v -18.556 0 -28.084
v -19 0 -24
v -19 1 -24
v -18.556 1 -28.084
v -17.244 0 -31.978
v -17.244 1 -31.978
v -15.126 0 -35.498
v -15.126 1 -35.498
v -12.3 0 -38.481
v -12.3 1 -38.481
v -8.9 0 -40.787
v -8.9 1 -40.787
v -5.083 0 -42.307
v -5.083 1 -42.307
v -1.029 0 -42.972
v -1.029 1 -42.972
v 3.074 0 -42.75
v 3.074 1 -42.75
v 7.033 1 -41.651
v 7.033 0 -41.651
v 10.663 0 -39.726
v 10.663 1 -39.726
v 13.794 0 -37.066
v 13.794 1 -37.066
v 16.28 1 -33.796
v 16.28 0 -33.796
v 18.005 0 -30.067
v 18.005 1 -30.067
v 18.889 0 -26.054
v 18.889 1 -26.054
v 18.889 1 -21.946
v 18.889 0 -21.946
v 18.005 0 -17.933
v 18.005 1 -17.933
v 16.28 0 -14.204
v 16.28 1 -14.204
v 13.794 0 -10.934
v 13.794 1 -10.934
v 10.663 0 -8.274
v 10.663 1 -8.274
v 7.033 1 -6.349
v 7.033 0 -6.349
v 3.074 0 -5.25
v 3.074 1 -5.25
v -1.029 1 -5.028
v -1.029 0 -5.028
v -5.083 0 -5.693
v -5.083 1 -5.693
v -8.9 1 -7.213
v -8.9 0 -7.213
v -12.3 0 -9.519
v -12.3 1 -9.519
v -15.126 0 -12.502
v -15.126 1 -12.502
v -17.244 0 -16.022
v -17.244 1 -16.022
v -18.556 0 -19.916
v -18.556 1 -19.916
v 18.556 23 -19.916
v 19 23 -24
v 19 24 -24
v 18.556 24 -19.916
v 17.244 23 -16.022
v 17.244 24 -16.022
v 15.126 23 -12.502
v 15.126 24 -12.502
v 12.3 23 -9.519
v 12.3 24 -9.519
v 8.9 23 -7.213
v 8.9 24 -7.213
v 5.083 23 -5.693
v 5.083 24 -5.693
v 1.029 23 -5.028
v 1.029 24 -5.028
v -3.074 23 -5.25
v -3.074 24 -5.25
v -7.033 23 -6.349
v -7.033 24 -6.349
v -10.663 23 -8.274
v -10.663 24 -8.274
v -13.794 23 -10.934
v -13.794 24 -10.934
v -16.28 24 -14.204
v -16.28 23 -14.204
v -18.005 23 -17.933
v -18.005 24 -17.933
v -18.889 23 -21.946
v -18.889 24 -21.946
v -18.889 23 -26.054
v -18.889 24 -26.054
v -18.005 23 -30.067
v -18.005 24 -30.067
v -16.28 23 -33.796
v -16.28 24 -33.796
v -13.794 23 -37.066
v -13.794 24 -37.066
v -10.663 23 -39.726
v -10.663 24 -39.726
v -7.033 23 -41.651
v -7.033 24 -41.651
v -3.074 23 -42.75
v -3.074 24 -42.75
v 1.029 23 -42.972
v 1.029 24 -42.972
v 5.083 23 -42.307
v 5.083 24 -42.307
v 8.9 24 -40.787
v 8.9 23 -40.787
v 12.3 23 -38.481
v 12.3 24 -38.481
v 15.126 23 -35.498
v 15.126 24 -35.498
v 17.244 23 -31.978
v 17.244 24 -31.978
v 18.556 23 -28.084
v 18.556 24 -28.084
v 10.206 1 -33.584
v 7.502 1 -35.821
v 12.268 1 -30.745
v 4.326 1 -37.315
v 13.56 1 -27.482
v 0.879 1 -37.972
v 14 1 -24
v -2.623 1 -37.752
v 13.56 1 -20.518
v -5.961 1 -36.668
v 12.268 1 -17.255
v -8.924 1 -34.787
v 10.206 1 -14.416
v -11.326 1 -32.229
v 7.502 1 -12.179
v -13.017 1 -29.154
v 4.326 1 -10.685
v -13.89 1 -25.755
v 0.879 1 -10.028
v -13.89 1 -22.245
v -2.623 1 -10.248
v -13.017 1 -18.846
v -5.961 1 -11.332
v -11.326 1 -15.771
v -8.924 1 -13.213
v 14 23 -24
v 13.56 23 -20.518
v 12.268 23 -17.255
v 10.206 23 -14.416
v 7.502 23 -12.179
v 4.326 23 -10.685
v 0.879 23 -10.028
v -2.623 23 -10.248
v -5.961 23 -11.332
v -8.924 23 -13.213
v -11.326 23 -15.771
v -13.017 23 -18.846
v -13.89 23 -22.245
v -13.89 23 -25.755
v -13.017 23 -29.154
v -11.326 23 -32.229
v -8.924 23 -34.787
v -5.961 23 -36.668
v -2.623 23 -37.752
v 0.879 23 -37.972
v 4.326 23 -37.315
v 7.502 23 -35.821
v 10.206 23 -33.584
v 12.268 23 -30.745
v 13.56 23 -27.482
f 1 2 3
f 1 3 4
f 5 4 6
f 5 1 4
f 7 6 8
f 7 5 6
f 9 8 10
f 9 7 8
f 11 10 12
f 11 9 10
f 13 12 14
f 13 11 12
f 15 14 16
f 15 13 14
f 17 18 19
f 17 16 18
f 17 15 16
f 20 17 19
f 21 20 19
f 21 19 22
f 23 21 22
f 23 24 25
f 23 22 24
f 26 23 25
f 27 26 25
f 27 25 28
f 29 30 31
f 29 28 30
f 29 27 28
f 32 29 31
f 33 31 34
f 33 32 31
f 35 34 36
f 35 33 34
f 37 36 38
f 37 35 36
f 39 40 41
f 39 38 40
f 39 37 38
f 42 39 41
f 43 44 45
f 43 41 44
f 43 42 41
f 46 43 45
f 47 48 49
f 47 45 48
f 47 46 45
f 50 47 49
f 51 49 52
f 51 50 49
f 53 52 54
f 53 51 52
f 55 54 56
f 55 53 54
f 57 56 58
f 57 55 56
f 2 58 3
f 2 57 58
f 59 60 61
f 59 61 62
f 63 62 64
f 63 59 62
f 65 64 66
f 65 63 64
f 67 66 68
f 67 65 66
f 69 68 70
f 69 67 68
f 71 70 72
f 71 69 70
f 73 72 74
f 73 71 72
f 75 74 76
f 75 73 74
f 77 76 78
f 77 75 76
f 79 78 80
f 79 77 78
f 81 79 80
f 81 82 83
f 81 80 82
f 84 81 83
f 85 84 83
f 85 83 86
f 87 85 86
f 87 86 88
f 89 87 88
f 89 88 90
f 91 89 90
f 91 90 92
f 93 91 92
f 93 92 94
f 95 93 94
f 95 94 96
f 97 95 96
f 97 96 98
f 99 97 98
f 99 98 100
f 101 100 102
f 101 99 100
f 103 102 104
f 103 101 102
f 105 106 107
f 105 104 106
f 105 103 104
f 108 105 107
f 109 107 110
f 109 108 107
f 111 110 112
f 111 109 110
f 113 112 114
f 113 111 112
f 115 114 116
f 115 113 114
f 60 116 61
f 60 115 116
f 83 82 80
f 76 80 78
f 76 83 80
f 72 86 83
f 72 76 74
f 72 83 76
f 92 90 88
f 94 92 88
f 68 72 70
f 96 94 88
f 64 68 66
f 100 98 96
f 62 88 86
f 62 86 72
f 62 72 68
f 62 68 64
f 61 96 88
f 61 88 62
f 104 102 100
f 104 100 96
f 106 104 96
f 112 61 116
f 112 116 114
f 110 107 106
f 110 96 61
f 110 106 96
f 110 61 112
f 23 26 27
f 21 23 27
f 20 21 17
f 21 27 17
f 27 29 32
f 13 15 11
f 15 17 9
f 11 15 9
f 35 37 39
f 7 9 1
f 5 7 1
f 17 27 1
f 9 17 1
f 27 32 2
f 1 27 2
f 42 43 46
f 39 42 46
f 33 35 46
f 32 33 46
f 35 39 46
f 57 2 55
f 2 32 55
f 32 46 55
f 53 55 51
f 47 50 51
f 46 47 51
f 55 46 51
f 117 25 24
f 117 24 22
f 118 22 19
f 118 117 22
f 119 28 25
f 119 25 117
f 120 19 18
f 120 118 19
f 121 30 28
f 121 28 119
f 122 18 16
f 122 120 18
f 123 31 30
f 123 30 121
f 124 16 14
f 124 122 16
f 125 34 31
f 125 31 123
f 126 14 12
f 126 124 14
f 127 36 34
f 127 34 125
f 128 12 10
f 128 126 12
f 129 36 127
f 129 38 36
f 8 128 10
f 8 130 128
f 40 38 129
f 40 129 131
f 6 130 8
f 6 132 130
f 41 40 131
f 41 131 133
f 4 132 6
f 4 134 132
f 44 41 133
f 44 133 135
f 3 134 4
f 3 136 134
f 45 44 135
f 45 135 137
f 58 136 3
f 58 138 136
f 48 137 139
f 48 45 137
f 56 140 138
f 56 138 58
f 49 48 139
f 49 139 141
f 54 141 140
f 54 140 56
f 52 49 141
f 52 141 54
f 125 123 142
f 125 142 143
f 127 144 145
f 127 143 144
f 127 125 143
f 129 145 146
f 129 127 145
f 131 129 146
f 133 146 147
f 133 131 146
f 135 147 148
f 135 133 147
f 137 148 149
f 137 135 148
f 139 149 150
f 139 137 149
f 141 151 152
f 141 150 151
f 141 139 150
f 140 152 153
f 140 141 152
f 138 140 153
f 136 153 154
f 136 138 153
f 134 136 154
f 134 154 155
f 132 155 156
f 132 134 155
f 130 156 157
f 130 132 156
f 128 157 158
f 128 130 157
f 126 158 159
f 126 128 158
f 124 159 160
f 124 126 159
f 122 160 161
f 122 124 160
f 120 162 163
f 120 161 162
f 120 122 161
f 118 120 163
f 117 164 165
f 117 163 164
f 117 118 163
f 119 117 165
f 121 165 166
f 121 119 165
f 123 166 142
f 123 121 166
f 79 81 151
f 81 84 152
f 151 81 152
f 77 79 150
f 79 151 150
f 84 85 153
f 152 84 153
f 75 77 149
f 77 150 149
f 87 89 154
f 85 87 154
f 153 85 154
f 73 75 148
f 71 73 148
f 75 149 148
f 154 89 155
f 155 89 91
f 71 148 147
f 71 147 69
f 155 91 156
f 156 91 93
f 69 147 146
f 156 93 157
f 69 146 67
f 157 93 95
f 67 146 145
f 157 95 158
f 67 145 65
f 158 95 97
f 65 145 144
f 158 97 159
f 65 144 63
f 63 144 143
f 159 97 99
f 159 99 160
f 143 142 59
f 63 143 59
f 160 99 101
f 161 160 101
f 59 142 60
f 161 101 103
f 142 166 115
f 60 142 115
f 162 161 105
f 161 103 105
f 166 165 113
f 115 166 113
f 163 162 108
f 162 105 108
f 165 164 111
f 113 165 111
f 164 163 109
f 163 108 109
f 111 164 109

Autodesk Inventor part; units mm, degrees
ref_plane "YZ Plane" through (0, 0, 0) normal (1, 0, 0) x (0, 1, 0)
ref_plane "XZ Plane" through (0, 0, 0) normal (0, 1, 0) x (-1, 0, 0)
ref_plane "XY Plane" through (0, 0, 0) normal (0, 0, 1) x (1, 0, 0)
sketch "Sketch1" plane through (0, 0, 0) normal (0, 1, 0) x (-1, 0, 0)
  circle A0 centre (0, -24) radius 19
  point P0 (0, 0)
  dimension "d1" = 38
  dimension "d3" = 24
extrude "Extrusion1" add sketch "Sketch1" along normal blind 1
sketch "Sketch3" plane through (0, 1, -24) normal (0, 1, 0) x (1, 0, 0)
  circle A0 centre (0, 0) radius 14
  circle A1 centre (0, 0) radius 19
  circle A2 centre (0, 0) radius 19
  point P0 (0, -24)
  dimension "d7" = 28
extrude "Extrusion3" add sketch "Sketch3" along normal blind 22 contours A0
sketch "Sketch5" plane through (0, 23, -24) normal (0, 1, 0) x (1, 0, 0)
  circle A0 centre (0, 0) radius 19
  point P0 (0, -24)
extrude "Extrusion5" add sketch "Sketch5" along normal blind 1
properties part number "flywheels"
